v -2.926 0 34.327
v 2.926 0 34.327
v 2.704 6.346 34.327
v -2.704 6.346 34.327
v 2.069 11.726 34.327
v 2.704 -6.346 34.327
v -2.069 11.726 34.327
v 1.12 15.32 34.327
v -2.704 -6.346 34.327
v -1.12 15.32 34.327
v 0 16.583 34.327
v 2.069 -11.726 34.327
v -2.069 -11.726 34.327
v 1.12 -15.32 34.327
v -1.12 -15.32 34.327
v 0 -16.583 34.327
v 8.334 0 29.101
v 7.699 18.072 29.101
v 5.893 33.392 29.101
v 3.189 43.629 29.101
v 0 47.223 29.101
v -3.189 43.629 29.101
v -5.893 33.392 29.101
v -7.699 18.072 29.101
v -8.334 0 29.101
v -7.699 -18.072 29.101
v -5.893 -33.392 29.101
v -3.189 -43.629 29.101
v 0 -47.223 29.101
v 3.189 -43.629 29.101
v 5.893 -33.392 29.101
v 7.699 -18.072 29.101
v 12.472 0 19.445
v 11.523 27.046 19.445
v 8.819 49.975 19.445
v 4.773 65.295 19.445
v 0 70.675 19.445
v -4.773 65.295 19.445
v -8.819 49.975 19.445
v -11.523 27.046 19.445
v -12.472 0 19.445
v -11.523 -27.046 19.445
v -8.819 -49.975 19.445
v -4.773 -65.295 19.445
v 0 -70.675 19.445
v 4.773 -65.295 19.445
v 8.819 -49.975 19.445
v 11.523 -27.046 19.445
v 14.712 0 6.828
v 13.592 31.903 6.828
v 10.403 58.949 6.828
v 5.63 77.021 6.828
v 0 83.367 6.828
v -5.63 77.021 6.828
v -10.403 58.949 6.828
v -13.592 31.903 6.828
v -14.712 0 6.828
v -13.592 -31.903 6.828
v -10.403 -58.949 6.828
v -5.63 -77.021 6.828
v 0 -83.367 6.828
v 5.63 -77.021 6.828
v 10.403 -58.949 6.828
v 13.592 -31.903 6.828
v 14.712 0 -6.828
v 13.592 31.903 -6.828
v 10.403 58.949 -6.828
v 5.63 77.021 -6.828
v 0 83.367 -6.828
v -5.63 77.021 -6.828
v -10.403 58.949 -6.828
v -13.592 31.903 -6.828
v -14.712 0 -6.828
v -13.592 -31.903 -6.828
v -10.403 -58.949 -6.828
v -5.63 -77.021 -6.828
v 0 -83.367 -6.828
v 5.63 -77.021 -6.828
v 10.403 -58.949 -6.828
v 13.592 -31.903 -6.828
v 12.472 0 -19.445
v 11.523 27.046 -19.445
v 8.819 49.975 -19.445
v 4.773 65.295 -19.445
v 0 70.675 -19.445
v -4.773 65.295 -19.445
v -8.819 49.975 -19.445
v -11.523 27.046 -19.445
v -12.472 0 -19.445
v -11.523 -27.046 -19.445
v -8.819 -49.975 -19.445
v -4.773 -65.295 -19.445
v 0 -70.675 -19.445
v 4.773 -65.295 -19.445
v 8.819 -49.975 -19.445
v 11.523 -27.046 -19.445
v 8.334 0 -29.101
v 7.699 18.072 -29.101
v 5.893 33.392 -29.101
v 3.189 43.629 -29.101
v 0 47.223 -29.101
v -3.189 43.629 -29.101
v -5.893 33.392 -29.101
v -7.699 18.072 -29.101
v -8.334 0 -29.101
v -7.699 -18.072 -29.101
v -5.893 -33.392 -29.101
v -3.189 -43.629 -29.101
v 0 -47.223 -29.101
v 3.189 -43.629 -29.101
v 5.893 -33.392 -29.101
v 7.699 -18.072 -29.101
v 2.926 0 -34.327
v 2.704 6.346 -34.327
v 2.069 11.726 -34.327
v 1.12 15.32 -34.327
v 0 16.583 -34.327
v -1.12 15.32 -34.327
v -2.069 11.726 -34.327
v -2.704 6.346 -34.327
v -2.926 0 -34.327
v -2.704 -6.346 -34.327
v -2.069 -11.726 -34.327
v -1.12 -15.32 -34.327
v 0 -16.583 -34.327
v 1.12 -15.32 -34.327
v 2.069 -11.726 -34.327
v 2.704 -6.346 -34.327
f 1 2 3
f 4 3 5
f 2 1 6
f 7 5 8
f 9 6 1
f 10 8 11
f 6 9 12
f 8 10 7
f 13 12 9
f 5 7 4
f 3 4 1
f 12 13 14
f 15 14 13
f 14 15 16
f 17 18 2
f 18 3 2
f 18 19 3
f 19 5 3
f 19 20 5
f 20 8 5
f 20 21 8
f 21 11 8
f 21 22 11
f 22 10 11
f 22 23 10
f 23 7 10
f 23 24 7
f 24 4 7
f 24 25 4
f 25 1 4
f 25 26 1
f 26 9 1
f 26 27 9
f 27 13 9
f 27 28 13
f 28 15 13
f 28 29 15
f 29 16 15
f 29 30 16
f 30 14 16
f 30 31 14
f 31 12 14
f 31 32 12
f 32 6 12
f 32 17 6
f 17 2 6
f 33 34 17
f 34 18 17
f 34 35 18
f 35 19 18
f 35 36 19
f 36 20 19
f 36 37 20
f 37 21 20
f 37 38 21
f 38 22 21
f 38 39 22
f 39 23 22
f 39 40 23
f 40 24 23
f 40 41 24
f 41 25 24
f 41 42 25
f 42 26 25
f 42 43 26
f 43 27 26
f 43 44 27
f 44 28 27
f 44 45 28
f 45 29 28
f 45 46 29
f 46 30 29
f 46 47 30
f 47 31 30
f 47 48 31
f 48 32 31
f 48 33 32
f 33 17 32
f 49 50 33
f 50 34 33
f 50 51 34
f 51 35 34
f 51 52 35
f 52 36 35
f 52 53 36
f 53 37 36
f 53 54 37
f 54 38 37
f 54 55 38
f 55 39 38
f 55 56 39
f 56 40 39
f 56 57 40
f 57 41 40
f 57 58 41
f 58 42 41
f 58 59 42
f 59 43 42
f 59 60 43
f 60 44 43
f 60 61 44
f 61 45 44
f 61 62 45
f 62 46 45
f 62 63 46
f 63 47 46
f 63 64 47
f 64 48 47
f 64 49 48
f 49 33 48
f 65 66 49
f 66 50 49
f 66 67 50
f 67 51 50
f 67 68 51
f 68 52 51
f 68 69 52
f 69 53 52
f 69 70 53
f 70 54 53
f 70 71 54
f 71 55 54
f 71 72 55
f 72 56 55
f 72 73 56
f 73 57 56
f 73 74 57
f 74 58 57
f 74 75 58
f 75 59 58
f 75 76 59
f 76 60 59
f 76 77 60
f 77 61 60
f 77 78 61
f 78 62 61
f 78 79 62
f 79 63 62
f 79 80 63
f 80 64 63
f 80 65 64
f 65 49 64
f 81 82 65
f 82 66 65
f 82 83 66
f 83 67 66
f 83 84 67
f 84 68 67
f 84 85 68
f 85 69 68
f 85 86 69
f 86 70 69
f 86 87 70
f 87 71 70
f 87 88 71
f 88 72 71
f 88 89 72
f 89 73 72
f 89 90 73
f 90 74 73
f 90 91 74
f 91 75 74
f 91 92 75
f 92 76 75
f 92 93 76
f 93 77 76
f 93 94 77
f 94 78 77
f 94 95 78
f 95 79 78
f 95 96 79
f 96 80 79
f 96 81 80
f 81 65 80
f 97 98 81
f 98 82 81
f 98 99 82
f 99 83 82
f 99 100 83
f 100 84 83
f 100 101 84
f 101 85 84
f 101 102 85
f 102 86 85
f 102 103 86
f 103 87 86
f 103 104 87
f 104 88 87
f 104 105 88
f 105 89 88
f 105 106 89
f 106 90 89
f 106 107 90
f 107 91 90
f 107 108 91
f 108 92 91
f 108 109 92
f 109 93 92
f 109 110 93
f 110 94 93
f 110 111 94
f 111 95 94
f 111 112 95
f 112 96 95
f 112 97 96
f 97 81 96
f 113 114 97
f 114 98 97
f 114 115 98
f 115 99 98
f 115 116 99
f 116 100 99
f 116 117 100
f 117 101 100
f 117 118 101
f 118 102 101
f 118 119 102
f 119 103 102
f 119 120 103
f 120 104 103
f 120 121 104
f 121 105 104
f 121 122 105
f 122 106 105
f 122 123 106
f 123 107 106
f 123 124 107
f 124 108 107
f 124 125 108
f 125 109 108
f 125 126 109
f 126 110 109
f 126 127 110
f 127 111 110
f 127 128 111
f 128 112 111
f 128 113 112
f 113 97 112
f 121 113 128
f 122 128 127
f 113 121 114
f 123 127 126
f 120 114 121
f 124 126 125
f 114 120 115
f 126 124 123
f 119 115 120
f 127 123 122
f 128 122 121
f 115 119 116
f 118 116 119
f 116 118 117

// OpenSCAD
// Generated by SolidPython 1.0.1 on 2020-07-29 00:46:45


scale(v = [3, 17, 7]) {
	sphere(r = 5);
}
/***********************************************
*********      SolidPython code:      **********
************************************************
 
# import packages: SolidPython
from solid import *
from solid.utils import *
from itertools import chain, combinations, permutations


class Resize:

    def __init__(self, scad_file):
        self.scad_file = scad_file
        #self.scad_file = import_scad(scad_file)
        # cone/cylinder param:
        self.r1 = 0
        self.r2 = 0
        self.h = 0
        # rectangular prism param:
        self.w = 0
        self.l = 0
        # ellipse param:
        self.r = 0

    # import OpenScad code (file name corresponds to shape)


    # classify shape + parameters
    def assign(self, param1, param2, param3):
        if self.scad_file == 'cone.scad':
            self.r1 = param1
            self.r2 = param2
            self.h = param3
        elif self.scad_file == 'cylinder.scad':
            self.r1 = param1
            self.r2 = param2
            self.h = param3
        elif self.scad_file == 'rectangularPrism.scad':
            self.h = param1
            self.l = param2
            self.w = param3
        else:
            self.r = param1
            self.h = param2

    # resize parameters
    def iterate(self):
        x = range(3, 20, 2)
        i = 1
        if self.scad_file == 'cone.scad':
            tempList = list(permutations(x, 2))
            for temp in tempList:
                param1 = temp[0]
                param2 = temp[1]
                filepath = 'produced_scad_files/' + 'cone' + str(param1) + '_' + str(param2) + '_' + '.scad'
                scad_render_to_file(cylinder(h=param1, r1=param2, r2=0), filepath)

        elif self.scad_file == 'cylinder.scad':
            tempList = list(permutations(x, 3))
            for temp in tempList:
                param1 = temp[0]
                param2 = temp[1]
                filepath = 'produced_scad_files/' + 'cylinder' + str(param1) + '_' + str(param2) + '_' + '.scad'
                scad_render_to_file(cylinder(h=param1, r1=param2, r2=param2), filepath)

        elif self.scad_file == 'rectangularPrism.scad':
            tempList = list(permutations(x, 3))
            for temp in tempList:
                param1 = temp[0]
                param2 = temp[1]
                param3 = temp[2]
                filepath = 'produced_scad_files/' + 'rectangularPrism' + str(param1) + '_' + str(param2) + '_' + str(
                    param3) + '.scad'
                scad_render_to_file(cube(size=(param1, param2, param3)), filepath)

        elif self.scad_file == 'ellipse.scad':
            tempList = list(permutations(x, 4))
            for temp in tempList:
                param1 = temp[0]
                param2 = temp[1]
                param3 = temp[2]
                param4 = temp[3]
                filepath = 'produced_scad_files/' + 'ellipse' + str(param1) + '_' + str(param2) + '_' + str(param3) + '_' + str(param4) + '.scad'
                scad_render_to_file(scale([param1, param2, param3])(sphere(r=param4)), filepath)

    def render_to_scadfile(self):
        scad_render_to_file(scad, 'example.scad') 
 
************************************************/
